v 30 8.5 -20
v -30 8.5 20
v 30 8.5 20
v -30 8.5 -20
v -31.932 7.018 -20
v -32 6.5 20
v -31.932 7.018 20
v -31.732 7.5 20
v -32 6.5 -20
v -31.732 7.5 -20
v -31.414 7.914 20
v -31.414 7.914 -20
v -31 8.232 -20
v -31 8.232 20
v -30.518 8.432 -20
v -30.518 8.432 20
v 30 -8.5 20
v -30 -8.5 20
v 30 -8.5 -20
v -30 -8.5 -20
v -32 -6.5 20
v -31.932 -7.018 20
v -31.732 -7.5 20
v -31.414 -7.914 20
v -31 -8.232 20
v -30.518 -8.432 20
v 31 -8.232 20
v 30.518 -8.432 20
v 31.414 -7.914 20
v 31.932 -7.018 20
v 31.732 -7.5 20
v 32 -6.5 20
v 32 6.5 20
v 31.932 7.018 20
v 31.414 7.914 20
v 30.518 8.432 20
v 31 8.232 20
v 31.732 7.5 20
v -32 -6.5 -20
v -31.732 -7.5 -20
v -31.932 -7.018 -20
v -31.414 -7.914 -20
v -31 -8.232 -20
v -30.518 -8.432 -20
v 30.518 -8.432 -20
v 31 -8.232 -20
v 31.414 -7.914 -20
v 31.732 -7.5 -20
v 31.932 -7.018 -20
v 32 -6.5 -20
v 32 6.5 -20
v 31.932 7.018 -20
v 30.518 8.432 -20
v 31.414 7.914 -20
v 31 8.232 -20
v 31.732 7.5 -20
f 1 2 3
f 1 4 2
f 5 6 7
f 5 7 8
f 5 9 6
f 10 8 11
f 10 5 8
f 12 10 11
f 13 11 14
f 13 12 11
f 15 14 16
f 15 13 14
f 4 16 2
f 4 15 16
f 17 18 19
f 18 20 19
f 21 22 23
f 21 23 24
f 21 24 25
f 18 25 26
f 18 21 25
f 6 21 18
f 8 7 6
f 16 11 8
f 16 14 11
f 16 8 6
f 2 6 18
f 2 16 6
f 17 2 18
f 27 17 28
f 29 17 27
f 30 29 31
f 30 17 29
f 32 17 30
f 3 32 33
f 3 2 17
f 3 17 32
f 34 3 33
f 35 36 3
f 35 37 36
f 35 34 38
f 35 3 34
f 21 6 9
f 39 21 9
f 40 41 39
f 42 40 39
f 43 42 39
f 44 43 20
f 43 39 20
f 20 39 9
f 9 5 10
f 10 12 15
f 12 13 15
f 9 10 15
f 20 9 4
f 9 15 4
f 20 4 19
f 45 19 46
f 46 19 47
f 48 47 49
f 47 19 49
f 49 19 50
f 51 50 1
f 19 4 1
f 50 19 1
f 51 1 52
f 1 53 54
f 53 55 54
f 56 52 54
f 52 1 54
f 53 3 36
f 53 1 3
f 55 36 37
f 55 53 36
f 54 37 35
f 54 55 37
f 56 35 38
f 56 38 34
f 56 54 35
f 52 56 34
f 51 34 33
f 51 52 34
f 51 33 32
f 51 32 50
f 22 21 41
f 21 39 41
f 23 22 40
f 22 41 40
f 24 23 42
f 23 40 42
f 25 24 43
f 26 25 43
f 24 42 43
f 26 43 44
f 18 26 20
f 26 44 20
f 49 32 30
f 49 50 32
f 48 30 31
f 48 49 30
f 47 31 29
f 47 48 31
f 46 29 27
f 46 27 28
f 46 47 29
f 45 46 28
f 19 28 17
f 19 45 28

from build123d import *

# Parameters (mm, degrees)
SKETCH1_W           = 64
SKETCH1_H           = 40
BOSS_EXTRUDE1_DEPTH = 8.5
FILLET1_R           = 2


with BuildPart() as part:
    # Sketch1 → Boss-Extrude1 (new body, symmetric)
    with BuildSketch(Plane(origin=(0, 0, 0), x_dir=(1, 0, 0), z_dir=(0, 1, 0))):
        Rectangle(SKETCH1_W, SKETCH1_H)
    extrude(amount=BOSS_EXTRUDE1_DEPTH, both=True)

    # Fillet1
    fillet1_edges = [part.edges().sort_by_distance(p)[0] for p in [
        (-32, 8.5, 0),
        (32, 8.5, 0),
        (-32, -8.5, 0),
        (32, -8.5, 0),
    ]]
    fillet(fillet1_edges, radius=FILLET1_R)


solid = part.part
